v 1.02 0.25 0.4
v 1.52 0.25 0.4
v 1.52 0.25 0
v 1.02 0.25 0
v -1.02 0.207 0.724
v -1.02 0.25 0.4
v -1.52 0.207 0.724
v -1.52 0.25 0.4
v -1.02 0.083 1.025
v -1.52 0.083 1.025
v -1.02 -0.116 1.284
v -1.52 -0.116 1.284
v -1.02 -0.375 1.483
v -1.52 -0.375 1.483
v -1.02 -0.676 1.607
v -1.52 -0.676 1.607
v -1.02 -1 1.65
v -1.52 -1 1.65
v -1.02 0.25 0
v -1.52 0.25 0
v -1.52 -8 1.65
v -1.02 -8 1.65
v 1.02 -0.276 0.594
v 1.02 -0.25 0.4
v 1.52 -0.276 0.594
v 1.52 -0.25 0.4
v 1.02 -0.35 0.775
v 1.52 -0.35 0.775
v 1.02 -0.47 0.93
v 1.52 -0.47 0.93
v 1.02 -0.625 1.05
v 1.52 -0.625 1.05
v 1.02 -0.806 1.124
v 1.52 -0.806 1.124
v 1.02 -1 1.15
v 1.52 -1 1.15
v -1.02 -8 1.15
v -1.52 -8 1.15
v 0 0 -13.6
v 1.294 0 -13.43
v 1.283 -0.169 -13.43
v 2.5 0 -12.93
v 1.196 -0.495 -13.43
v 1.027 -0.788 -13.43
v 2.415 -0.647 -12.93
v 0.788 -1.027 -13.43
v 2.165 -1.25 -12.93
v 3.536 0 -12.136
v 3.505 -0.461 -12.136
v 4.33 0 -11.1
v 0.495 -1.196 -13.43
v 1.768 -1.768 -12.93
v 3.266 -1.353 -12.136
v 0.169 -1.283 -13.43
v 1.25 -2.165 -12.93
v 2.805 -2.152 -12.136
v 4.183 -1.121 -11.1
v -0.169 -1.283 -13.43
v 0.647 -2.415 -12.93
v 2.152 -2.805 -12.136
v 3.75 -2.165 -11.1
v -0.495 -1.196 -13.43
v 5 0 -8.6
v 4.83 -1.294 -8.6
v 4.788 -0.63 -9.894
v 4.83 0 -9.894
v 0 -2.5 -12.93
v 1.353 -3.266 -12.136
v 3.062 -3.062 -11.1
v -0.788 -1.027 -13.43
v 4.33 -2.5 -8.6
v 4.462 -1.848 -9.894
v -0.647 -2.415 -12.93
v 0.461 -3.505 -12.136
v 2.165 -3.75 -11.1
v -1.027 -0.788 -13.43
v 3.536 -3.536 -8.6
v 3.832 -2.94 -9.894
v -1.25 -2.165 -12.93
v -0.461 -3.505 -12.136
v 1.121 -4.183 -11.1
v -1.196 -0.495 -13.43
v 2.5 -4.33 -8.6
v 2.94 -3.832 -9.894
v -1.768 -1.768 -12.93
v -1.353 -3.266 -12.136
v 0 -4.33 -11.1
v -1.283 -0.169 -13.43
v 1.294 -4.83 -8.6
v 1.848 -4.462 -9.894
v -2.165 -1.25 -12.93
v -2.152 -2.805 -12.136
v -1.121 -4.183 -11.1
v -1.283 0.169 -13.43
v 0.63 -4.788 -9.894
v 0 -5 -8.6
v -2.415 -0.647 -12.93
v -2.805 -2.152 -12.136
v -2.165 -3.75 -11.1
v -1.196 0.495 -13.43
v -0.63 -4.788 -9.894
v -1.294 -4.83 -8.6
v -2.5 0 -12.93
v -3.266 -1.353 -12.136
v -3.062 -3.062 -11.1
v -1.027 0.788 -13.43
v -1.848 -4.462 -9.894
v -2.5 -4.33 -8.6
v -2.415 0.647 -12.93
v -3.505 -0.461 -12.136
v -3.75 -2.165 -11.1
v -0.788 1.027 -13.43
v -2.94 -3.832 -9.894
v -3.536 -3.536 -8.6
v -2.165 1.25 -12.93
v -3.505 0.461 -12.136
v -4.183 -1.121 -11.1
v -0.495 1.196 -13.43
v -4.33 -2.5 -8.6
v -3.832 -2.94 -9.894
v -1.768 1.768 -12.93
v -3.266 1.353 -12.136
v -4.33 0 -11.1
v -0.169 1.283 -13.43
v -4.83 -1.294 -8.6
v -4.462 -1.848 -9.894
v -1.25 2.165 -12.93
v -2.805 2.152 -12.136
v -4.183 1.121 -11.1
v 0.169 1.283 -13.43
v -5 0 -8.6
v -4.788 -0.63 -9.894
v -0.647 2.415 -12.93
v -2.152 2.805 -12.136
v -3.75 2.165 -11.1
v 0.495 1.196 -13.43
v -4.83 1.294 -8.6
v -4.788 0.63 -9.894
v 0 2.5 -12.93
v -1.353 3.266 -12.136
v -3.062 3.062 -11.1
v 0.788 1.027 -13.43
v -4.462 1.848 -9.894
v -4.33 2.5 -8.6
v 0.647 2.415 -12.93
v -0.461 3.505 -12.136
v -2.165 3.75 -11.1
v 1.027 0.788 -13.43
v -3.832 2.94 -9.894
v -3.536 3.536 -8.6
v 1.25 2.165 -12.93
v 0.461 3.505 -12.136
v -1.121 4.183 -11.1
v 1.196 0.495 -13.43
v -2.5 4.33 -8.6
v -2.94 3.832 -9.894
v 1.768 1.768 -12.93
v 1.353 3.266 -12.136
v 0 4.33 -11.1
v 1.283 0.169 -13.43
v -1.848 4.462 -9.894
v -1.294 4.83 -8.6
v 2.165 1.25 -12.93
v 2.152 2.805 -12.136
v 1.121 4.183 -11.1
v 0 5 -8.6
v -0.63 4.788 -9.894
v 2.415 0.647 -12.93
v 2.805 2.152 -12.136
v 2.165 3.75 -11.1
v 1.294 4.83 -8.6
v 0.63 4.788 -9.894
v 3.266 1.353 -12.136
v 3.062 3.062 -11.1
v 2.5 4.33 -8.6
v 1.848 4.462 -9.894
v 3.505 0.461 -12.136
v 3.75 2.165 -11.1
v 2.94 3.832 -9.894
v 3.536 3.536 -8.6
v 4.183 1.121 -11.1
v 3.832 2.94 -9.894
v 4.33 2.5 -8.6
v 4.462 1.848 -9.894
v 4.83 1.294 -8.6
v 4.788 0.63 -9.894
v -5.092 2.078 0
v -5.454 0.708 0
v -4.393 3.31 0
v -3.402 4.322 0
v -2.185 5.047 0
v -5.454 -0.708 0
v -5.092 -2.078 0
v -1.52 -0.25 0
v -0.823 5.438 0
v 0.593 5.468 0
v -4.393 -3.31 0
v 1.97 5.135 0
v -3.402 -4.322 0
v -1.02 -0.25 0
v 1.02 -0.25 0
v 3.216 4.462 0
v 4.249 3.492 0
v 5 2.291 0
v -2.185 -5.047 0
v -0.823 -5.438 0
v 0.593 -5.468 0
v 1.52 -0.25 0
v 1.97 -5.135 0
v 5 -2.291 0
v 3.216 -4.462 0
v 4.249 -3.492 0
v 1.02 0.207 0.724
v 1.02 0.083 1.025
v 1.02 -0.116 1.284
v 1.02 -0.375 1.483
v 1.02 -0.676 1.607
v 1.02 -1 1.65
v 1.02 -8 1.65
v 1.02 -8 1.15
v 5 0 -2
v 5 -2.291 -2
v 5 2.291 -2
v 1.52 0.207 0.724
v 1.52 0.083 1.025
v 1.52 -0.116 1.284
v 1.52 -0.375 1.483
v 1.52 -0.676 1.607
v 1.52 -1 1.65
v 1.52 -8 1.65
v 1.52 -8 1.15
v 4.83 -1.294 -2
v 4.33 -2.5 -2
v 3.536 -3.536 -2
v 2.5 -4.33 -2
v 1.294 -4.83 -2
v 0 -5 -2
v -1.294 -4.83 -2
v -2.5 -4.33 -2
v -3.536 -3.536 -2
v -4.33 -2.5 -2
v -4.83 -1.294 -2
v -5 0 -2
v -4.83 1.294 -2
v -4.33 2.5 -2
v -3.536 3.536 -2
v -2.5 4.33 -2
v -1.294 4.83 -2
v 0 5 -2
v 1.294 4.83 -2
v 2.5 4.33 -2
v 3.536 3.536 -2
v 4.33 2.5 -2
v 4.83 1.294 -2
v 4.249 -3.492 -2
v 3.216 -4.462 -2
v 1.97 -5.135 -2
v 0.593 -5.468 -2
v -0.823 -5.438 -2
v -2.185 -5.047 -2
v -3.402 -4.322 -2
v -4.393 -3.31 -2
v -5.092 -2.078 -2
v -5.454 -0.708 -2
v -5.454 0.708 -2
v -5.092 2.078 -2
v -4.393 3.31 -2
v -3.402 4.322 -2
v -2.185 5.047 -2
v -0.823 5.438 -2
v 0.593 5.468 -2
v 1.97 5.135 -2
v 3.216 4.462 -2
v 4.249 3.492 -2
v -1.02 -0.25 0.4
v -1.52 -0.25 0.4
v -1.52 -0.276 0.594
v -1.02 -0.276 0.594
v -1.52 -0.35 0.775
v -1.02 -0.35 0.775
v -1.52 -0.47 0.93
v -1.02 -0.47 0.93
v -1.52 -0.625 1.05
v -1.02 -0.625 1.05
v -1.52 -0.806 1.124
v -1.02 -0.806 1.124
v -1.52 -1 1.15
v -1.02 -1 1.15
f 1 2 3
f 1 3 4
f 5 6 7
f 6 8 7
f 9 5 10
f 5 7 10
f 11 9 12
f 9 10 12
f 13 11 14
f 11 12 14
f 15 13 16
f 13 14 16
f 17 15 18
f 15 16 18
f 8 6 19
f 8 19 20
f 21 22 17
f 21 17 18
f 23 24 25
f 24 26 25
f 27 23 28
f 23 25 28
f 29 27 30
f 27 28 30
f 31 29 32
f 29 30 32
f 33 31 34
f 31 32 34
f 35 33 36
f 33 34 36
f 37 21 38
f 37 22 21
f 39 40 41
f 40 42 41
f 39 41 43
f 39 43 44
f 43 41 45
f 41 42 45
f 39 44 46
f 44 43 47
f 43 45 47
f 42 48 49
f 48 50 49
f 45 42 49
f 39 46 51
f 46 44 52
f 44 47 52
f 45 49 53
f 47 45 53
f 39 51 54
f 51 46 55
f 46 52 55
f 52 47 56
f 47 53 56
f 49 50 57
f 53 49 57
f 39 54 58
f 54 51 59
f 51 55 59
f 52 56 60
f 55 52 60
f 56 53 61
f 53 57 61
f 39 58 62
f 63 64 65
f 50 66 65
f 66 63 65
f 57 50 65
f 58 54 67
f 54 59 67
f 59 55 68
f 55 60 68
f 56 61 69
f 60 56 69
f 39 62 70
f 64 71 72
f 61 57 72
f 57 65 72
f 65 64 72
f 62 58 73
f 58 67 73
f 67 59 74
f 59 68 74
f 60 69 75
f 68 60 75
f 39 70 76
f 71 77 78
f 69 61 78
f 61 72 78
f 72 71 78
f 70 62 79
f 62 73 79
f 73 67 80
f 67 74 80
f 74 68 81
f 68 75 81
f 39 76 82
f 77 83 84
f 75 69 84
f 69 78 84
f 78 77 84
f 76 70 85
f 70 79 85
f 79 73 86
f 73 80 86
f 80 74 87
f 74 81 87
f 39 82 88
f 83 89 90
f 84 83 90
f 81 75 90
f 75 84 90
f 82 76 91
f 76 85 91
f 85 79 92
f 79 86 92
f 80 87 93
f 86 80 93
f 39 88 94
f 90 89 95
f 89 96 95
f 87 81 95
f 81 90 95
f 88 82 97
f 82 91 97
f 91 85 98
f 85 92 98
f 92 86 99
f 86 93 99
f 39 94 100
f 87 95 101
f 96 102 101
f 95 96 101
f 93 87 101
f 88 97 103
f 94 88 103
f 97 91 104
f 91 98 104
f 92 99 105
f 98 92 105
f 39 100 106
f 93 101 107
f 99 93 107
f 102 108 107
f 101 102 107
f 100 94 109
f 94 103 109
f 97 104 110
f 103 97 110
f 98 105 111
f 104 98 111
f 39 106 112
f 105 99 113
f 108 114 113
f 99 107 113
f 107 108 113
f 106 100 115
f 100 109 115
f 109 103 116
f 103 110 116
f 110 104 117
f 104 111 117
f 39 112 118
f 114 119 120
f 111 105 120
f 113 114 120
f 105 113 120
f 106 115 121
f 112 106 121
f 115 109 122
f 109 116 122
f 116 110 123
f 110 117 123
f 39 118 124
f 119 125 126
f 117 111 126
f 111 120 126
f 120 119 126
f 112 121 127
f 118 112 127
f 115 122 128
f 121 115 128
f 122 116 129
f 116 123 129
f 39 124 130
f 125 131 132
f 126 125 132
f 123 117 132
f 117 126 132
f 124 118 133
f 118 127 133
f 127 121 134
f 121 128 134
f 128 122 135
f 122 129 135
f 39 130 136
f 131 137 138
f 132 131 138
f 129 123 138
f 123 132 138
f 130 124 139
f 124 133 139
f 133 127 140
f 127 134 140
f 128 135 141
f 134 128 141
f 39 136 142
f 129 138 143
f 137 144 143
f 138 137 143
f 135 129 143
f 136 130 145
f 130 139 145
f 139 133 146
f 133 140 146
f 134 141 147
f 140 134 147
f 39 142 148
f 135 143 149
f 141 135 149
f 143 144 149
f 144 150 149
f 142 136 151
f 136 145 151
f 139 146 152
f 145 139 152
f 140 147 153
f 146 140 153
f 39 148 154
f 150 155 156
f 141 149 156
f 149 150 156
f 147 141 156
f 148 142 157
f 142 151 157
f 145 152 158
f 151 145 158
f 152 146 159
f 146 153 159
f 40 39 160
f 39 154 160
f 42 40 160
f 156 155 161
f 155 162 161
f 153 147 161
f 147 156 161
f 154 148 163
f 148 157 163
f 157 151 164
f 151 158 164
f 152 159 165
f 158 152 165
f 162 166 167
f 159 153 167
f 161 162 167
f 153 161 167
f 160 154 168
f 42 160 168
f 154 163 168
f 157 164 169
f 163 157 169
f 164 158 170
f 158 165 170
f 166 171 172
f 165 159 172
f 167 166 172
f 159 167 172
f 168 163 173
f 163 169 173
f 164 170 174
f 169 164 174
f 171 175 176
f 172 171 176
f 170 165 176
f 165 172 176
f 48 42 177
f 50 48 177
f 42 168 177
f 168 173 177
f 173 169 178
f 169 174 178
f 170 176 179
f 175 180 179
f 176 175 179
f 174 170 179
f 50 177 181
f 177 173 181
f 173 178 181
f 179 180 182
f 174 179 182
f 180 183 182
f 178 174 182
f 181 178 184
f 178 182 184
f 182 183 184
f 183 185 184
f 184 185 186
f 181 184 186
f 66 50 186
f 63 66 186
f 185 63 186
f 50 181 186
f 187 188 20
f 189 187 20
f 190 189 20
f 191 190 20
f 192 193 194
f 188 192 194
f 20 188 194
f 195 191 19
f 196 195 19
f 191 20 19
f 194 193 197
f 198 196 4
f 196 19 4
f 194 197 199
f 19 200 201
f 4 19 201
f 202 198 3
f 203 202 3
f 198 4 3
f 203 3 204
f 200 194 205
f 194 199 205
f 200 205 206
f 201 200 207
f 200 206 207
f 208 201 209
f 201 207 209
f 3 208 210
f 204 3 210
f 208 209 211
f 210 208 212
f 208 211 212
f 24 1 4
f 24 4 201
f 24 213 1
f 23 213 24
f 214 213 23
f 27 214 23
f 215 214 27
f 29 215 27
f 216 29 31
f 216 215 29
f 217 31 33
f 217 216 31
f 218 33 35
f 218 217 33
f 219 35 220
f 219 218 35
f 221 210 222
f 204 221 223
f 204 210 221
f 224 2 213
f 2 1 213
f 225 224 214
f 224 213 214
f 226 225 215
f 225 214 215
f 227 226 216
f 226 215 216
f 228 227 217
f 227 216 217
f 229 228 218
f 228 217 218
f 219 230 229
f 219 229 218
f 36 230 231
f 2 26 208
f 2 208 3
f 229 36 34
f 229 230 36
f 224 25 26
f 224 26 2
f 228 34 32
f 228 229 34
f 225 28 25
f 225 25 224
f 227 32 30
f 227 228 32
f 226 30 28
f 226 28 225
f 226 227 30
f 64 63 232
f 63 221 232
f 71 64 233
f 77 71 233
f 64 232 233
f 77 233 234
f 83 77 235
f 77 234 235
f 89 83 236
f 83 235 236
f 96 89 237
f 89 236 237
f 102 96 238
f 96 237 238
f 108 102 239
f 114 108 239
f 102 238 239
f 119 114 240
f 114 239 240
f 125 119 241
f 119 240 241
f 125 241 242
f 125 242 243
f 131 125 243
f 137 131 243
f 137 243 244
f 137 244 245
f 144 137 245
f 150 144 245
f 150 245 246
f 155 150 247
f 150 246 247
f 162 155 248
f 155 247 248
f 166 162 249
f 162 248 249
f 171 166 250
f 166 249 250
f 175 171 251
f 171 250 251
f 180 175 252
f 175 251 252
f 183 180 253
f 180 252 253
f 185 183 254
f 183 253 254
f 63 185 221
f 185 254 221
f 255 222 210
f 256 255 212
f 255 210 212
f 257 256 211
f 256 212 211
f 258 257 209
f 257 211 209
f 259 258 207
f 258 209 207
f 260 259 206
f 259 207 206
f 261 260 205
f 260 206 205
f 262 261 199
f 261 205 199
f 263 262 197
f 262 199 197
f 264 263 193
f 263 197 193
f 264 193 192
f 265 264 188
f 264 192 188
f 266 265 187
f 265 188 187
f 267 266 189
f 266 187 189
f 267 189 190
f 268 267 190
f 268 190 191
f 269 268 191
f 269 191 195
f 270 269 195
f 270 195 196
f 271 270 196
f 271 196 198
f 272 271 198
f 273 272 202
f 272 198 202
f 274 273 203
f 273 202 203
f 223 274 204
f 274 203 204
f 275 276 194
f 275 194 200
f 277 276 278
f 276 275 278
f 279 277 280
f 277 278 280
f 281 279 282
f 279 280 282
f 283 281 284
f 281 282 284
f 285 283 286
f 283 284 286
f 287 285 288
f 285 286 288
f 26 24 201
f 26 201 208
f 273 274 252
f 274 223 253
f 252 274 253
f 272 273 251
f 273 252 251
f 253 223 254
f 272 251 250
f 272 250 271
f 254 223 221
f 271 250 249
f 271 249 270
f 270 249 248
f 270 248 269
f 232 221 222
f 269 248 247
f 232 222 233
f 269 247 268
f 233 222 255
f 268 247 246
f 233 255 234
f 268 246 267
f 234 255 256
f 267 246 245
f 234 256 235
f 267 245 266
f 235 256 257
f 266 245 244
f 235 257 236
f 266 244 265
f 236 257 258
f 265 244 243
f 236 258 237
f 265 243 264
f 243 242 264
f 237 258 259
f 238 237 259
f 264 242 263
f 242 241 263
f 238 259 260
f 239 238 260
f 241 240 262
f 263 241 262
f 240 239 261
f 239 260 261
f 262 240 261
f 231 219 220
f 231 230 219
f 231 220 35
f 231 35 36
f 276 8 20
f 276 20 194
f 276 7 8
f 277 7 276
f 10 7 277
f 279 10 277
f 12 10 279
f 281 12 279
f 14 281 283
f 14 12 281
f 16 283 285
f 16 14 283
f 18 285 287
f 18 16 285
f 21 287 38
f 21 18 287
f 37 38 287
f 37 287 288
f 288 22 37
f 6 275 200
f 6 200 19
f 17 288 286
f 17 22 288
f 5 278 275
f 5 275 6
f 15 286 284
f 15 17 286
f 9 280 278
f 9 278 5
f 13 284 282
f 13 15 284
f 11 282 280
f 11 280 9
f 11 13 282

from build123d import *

# Parameters (mm, degrees)
SKETCH2_W          = 0.5
SKETCH2_H          = 4.582575694
CUT_EXTRUDE1_DEPTH = 16.667163113
SKETCH3_W          = 0.5
SKETCH3_H          = 0.5


with BuildPart() as part:
    # Sketch1 → Revolve1 (revolve)
    with BuildSketch(Plane(origin=(0, 0, 0), x_dir=(1, 0, 0), z_dir=(0, 1, 0))):
        with BuildLine():
            Line((0, 0), (0, 13.6))
            ThreePointArc((0, 13.6), (3.535533906, 12.135533906), (5, 8.6))
            Line((5, 8.6), (5, 2))
            Line((5, 2), (5.5, 2))
            Line((5.5, 2), (5.5, 0))
            Line((5.5, 0), (0, 0))
        make_face()
    revolve(axis=Axis((0, 0, 0), (0, 0, -1)))

    # Sketch2 → Cut-Extrude1 (cut, through all)
    with BuildSketch(Plane.XY):
        with Locations((5.25, 0)):
            Rectangle(SKETCH2_W, SKETCH2_H)
    extrude(amount=-CUT_EXTRUDE1_DEPTH, mode=Mode.SUBTRACT)

    # Sweep1: sweep along a path in Sketch4
    with BuildLine(Plane(origin=(1.27, 0, 0), x_dir=(0, 0, -1), z_dir=(1, 0, 0))) as sweep1_path:
        Line((0, 0), (-0.4, 0))
        ThreePointArc((-0.4, 0), (-1.107106781, -0.292893219), (-1.4, -1))
        Line((-1.4, -1), (-1.4, -8))
    # Sketch3 → Sweep1 (sweep)
    with BuildSketch(Plane.XY):
        with Locations((-1.27, 0)):
            Rectangle(SKETCH3_W, SKETCH3_H)
        with Locations((1.27, 0)):
            Rectangle(SKETCH3_W, SKETCH3_H)
    sweep(path=sweep1_path.line)


solid = part.part
